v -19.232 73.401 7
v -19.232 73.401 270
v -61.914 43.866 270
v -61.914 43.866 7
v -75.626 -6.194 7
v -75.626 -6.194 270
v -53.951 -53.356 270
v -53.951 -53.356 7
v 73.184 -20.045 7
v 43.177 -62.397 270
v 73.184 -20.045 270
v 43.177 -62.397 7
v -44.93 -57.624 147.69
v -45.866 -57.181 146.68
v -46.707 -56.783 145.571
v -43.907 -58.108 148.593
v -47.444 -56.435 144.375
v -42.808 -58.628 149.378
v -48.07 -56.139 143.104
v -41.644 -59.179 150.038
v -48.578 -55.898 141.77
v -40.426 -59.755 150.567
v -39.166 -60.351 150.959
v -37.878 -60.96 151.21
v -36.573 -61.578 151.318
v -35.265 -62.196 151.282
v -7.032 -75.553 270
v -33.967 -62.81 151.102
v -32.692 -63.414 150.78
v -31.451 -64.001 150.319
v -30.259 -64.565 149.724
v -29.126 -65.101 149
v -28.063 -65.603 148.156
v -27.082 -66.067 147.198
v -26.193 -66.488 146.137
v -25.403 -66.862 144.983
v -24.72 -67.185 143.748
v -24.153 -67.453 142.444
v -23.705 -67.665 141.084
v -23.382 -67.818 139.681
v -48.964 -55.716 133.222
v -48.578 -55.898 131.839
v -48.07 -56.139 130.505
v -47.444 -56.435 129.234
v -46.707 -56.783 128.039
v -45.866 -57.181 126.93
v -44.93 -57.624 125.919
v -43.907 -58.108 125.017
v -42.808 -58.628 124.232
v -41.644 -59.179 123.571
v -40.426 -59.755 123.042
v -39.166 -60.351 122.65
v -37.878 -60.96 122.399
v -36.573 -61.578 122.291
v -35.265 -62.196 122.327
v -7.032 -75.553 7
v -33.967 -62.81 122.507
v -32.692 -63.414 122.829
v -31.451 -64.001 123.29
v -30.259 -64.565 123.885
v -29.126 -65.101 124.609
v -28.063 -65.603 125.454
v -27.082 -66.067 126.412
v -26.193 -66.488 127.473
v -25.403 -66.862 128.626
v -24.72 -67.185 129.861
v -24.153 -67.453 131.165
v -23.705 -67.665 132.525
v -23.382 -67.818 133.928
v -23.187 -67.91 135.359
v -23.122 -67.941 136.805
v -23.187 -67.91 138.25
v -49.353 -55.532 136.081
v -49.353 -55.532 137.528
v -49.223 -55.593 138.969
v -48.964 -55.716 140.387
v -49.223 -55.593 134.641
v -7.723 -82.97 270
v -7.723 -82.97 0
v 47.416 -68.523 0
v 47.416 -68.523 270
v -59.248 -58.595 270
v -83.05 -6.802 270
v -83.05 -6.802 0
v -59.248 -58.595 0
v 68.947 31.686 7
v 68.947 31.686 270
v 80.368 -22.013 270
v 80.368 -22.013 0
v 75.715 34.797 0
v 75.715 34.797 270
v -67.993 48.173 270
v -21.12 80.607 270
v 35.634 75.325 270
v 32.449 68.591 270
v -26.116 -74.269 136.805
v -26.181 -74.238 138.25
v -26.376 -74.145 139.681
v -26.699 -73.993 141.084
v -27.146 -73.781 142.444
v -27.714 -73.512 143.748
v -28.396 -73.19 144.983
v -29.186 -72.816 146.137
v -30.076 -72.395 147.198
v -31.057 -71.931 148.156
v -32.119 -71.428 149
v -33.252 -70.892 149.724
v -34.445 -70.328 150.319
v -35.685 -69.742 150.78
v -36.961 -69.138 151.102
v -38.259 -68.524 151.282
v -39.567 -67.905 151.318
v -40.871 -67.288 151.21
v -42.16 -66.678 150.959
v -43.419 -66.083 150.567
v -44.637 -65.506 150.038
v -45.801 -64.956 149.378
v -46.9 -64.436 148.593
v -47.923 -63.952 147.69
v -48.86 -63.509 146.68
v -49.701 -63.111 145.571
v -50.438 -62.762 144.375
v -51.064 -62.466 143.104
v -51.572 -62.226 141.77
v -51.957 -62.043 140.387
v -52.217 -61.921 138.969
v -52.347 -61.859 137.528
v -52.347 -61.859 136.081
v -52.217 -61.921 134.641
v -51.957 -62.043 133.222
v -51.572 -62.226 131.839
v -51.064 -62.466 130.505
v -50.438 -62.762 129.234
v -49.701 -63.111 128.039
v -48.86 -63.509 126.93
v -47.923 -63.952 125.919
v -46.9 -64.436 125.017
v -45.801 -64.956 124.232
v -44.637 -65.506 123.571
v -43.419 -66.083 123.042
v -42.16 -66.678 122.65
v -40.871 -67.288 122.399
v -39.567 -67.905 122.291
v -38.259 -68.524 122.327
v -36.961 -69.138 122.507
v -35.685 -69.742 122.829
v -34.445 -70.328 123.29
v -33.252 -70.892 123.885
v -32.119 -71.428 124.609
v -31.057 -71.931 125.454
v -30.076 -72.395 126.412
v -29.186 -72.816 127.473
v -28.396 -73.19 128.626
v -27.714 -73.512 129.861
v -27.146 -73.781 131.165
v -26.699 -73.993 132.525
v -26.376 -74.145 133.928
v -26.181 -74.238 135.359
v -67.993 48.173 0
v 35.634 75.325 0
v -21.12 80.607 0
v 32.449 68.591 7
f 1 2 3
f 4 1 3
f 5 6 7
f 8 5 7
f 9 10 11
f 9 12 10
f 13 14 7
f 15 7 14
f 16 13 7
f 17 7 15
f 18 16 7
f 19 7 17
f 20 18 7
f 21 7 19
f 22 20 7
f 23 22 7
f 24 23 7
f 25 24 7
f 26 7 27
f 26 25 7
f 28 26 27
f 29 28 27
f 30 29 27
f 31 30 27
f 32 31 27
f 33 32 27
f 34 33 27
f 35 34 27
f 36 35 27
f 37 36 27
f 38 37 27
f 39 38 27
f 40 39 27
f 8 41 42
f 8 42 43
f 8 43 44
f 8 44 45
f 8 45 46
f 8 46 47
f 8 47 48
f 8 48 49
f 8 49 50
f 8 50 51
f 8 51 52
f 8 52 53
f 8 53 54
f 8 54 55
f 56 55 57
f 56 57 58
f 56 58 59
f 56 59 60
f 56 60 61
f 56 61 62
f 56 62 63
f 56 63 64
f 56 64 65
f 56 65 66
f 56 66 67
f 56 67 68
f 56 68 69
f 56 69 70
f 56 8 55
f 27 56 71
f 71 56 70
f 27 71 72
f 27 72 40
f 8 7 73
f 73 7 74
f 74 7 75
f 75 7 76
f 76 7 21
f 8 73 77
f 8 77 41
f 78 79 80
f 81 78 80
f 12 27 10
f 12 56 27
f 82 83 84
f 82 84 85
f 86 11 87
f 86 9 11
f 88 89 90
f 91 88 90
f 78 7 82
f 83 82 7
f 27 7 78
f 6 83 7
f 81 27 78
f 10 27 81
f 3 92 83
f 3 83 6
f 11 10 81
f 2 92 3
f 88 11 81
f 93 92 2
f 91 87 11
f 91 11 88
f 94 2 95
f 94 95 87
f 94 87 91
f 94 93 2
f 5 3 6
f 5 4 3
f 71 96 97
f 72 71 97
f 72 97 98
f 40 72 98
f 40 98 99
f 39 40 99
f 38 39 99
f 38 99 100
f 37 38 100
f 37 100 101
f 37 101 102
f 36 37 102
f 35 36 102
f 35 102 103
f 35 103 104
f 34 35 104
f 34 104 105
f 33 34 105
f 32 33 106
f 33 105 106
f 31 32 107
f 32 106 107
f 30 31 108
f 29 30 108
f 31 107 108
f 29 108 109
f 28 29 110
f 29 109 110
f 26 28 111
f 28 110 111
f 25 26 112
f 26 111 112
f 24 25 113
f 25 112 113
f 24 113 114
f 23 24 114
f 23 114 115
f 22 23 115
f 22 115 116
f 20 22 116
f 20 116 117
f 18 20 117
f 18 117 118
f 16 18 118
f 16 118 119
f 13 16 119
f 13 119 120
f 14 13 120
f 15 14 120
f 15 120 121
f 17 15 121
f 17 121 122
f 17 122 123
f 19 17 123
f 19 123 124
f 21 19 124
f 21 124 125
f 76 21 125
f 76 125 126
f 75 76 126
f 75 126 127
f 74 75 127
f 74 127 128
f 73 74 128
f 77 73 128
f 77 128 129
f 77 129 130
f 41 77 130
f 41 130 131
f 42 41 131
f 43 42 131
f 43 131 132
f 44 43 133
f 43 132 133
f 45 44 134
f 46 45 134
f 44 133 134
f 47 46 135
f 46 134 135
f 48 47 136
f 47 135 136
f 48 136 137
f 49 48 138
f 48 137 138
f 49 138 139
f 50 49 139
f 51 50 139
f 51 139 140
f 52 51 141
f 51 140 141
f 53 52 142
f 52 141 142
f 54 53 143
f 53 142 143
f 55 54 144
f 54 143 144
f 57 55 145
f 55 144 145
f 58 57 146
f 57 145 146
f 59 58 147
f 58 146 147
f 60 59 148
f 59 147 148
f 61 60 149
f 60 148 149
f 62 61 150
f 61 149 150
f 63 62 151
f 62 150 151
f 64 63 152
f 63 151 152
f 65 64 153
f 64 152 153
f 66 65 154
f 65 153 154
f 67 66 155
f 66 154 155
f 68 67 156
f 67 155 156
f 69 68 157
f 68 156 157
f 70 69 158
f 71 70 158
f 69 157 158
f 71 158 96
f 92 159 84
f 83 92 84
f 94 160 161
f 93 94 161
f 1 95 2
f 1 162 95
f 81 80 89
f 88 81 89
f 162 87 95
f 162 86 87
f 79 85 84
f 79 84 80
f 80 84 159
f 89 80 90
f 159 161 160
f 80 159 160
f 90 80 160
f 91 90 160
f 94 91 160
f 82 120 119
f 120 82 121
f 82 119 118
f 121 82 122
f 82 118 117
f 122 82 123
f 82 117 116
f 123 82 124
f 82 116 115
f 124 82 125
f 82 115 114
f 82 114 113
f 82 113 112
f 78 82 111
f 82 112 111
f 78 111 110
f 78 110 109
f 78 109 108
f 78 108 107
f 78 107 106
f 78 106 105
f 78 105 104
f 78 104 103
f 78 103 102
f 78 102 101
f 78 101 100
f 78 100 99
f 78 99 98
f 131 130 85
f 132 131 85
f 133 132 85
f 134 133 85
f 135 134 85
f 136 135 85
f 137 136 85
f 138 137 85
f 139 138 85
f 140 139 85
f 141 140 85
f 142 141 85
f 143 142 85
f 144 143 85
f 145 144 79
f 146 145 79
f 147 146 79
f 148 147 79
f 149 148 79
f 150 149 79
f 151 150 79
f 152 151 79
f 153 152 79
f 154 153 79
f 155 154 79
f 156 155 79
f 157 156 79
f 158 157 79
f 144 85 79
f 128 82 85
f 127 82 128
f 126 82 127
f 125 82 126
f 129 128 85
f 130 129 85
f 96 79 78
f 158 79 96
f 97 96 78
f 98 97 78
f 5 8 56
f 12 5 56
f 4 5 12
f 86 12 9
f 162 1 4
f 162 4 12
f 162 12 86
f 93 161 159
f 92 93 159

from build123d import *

# Parameters (mm, degrees)
F1_DEPTH = 270
F2_T     = -7
F3_R     = 14.5182596714
F4_DEPTH = 25


with BuildPart() as f1:
    # F0 (on Top) → F1 (new body)
    with BuildSketch(Plane.XY):
        Polygon((47.4160599989, -68.5225782833), (80.3682735811, -22.0128844547), (75.7152787608, 34.7968826563), (35.6342635267, 75.3248016481), (-21.1204196422, 80.6074088069), (-67.9926237332, 48.1729135333), (-83.0503235256, -6.8022233647), (-59.2478539389, -58.5945243522), (-7.7226550276, -82.9697961896), align=None)
    extrude(amount=F1_DEPTH)

    # F2
    f2_openings = [f1.faces().sort_by_distance(p)[0] for p in [
        (0, 0, 270),
    ]]
    offset(amount=F2_T, openings=f2_openings)

    # F3 (on face) → F4 (cut)
    with BuildSketch(Plane(origin=(-33.4852544832, -70.7821602709, 0), x_dir=(0.9039508581, -0.427636348, 0), z_dir=(-0.427636348, -0.9039508581, 0))):
        with Locations((-6.3656242564, 136.8046998978)):
            Circle(F3_R)
    extrude(amount=-F4_DEPTH, mode=Mode.SUBTRACT)


solid = f1.part
